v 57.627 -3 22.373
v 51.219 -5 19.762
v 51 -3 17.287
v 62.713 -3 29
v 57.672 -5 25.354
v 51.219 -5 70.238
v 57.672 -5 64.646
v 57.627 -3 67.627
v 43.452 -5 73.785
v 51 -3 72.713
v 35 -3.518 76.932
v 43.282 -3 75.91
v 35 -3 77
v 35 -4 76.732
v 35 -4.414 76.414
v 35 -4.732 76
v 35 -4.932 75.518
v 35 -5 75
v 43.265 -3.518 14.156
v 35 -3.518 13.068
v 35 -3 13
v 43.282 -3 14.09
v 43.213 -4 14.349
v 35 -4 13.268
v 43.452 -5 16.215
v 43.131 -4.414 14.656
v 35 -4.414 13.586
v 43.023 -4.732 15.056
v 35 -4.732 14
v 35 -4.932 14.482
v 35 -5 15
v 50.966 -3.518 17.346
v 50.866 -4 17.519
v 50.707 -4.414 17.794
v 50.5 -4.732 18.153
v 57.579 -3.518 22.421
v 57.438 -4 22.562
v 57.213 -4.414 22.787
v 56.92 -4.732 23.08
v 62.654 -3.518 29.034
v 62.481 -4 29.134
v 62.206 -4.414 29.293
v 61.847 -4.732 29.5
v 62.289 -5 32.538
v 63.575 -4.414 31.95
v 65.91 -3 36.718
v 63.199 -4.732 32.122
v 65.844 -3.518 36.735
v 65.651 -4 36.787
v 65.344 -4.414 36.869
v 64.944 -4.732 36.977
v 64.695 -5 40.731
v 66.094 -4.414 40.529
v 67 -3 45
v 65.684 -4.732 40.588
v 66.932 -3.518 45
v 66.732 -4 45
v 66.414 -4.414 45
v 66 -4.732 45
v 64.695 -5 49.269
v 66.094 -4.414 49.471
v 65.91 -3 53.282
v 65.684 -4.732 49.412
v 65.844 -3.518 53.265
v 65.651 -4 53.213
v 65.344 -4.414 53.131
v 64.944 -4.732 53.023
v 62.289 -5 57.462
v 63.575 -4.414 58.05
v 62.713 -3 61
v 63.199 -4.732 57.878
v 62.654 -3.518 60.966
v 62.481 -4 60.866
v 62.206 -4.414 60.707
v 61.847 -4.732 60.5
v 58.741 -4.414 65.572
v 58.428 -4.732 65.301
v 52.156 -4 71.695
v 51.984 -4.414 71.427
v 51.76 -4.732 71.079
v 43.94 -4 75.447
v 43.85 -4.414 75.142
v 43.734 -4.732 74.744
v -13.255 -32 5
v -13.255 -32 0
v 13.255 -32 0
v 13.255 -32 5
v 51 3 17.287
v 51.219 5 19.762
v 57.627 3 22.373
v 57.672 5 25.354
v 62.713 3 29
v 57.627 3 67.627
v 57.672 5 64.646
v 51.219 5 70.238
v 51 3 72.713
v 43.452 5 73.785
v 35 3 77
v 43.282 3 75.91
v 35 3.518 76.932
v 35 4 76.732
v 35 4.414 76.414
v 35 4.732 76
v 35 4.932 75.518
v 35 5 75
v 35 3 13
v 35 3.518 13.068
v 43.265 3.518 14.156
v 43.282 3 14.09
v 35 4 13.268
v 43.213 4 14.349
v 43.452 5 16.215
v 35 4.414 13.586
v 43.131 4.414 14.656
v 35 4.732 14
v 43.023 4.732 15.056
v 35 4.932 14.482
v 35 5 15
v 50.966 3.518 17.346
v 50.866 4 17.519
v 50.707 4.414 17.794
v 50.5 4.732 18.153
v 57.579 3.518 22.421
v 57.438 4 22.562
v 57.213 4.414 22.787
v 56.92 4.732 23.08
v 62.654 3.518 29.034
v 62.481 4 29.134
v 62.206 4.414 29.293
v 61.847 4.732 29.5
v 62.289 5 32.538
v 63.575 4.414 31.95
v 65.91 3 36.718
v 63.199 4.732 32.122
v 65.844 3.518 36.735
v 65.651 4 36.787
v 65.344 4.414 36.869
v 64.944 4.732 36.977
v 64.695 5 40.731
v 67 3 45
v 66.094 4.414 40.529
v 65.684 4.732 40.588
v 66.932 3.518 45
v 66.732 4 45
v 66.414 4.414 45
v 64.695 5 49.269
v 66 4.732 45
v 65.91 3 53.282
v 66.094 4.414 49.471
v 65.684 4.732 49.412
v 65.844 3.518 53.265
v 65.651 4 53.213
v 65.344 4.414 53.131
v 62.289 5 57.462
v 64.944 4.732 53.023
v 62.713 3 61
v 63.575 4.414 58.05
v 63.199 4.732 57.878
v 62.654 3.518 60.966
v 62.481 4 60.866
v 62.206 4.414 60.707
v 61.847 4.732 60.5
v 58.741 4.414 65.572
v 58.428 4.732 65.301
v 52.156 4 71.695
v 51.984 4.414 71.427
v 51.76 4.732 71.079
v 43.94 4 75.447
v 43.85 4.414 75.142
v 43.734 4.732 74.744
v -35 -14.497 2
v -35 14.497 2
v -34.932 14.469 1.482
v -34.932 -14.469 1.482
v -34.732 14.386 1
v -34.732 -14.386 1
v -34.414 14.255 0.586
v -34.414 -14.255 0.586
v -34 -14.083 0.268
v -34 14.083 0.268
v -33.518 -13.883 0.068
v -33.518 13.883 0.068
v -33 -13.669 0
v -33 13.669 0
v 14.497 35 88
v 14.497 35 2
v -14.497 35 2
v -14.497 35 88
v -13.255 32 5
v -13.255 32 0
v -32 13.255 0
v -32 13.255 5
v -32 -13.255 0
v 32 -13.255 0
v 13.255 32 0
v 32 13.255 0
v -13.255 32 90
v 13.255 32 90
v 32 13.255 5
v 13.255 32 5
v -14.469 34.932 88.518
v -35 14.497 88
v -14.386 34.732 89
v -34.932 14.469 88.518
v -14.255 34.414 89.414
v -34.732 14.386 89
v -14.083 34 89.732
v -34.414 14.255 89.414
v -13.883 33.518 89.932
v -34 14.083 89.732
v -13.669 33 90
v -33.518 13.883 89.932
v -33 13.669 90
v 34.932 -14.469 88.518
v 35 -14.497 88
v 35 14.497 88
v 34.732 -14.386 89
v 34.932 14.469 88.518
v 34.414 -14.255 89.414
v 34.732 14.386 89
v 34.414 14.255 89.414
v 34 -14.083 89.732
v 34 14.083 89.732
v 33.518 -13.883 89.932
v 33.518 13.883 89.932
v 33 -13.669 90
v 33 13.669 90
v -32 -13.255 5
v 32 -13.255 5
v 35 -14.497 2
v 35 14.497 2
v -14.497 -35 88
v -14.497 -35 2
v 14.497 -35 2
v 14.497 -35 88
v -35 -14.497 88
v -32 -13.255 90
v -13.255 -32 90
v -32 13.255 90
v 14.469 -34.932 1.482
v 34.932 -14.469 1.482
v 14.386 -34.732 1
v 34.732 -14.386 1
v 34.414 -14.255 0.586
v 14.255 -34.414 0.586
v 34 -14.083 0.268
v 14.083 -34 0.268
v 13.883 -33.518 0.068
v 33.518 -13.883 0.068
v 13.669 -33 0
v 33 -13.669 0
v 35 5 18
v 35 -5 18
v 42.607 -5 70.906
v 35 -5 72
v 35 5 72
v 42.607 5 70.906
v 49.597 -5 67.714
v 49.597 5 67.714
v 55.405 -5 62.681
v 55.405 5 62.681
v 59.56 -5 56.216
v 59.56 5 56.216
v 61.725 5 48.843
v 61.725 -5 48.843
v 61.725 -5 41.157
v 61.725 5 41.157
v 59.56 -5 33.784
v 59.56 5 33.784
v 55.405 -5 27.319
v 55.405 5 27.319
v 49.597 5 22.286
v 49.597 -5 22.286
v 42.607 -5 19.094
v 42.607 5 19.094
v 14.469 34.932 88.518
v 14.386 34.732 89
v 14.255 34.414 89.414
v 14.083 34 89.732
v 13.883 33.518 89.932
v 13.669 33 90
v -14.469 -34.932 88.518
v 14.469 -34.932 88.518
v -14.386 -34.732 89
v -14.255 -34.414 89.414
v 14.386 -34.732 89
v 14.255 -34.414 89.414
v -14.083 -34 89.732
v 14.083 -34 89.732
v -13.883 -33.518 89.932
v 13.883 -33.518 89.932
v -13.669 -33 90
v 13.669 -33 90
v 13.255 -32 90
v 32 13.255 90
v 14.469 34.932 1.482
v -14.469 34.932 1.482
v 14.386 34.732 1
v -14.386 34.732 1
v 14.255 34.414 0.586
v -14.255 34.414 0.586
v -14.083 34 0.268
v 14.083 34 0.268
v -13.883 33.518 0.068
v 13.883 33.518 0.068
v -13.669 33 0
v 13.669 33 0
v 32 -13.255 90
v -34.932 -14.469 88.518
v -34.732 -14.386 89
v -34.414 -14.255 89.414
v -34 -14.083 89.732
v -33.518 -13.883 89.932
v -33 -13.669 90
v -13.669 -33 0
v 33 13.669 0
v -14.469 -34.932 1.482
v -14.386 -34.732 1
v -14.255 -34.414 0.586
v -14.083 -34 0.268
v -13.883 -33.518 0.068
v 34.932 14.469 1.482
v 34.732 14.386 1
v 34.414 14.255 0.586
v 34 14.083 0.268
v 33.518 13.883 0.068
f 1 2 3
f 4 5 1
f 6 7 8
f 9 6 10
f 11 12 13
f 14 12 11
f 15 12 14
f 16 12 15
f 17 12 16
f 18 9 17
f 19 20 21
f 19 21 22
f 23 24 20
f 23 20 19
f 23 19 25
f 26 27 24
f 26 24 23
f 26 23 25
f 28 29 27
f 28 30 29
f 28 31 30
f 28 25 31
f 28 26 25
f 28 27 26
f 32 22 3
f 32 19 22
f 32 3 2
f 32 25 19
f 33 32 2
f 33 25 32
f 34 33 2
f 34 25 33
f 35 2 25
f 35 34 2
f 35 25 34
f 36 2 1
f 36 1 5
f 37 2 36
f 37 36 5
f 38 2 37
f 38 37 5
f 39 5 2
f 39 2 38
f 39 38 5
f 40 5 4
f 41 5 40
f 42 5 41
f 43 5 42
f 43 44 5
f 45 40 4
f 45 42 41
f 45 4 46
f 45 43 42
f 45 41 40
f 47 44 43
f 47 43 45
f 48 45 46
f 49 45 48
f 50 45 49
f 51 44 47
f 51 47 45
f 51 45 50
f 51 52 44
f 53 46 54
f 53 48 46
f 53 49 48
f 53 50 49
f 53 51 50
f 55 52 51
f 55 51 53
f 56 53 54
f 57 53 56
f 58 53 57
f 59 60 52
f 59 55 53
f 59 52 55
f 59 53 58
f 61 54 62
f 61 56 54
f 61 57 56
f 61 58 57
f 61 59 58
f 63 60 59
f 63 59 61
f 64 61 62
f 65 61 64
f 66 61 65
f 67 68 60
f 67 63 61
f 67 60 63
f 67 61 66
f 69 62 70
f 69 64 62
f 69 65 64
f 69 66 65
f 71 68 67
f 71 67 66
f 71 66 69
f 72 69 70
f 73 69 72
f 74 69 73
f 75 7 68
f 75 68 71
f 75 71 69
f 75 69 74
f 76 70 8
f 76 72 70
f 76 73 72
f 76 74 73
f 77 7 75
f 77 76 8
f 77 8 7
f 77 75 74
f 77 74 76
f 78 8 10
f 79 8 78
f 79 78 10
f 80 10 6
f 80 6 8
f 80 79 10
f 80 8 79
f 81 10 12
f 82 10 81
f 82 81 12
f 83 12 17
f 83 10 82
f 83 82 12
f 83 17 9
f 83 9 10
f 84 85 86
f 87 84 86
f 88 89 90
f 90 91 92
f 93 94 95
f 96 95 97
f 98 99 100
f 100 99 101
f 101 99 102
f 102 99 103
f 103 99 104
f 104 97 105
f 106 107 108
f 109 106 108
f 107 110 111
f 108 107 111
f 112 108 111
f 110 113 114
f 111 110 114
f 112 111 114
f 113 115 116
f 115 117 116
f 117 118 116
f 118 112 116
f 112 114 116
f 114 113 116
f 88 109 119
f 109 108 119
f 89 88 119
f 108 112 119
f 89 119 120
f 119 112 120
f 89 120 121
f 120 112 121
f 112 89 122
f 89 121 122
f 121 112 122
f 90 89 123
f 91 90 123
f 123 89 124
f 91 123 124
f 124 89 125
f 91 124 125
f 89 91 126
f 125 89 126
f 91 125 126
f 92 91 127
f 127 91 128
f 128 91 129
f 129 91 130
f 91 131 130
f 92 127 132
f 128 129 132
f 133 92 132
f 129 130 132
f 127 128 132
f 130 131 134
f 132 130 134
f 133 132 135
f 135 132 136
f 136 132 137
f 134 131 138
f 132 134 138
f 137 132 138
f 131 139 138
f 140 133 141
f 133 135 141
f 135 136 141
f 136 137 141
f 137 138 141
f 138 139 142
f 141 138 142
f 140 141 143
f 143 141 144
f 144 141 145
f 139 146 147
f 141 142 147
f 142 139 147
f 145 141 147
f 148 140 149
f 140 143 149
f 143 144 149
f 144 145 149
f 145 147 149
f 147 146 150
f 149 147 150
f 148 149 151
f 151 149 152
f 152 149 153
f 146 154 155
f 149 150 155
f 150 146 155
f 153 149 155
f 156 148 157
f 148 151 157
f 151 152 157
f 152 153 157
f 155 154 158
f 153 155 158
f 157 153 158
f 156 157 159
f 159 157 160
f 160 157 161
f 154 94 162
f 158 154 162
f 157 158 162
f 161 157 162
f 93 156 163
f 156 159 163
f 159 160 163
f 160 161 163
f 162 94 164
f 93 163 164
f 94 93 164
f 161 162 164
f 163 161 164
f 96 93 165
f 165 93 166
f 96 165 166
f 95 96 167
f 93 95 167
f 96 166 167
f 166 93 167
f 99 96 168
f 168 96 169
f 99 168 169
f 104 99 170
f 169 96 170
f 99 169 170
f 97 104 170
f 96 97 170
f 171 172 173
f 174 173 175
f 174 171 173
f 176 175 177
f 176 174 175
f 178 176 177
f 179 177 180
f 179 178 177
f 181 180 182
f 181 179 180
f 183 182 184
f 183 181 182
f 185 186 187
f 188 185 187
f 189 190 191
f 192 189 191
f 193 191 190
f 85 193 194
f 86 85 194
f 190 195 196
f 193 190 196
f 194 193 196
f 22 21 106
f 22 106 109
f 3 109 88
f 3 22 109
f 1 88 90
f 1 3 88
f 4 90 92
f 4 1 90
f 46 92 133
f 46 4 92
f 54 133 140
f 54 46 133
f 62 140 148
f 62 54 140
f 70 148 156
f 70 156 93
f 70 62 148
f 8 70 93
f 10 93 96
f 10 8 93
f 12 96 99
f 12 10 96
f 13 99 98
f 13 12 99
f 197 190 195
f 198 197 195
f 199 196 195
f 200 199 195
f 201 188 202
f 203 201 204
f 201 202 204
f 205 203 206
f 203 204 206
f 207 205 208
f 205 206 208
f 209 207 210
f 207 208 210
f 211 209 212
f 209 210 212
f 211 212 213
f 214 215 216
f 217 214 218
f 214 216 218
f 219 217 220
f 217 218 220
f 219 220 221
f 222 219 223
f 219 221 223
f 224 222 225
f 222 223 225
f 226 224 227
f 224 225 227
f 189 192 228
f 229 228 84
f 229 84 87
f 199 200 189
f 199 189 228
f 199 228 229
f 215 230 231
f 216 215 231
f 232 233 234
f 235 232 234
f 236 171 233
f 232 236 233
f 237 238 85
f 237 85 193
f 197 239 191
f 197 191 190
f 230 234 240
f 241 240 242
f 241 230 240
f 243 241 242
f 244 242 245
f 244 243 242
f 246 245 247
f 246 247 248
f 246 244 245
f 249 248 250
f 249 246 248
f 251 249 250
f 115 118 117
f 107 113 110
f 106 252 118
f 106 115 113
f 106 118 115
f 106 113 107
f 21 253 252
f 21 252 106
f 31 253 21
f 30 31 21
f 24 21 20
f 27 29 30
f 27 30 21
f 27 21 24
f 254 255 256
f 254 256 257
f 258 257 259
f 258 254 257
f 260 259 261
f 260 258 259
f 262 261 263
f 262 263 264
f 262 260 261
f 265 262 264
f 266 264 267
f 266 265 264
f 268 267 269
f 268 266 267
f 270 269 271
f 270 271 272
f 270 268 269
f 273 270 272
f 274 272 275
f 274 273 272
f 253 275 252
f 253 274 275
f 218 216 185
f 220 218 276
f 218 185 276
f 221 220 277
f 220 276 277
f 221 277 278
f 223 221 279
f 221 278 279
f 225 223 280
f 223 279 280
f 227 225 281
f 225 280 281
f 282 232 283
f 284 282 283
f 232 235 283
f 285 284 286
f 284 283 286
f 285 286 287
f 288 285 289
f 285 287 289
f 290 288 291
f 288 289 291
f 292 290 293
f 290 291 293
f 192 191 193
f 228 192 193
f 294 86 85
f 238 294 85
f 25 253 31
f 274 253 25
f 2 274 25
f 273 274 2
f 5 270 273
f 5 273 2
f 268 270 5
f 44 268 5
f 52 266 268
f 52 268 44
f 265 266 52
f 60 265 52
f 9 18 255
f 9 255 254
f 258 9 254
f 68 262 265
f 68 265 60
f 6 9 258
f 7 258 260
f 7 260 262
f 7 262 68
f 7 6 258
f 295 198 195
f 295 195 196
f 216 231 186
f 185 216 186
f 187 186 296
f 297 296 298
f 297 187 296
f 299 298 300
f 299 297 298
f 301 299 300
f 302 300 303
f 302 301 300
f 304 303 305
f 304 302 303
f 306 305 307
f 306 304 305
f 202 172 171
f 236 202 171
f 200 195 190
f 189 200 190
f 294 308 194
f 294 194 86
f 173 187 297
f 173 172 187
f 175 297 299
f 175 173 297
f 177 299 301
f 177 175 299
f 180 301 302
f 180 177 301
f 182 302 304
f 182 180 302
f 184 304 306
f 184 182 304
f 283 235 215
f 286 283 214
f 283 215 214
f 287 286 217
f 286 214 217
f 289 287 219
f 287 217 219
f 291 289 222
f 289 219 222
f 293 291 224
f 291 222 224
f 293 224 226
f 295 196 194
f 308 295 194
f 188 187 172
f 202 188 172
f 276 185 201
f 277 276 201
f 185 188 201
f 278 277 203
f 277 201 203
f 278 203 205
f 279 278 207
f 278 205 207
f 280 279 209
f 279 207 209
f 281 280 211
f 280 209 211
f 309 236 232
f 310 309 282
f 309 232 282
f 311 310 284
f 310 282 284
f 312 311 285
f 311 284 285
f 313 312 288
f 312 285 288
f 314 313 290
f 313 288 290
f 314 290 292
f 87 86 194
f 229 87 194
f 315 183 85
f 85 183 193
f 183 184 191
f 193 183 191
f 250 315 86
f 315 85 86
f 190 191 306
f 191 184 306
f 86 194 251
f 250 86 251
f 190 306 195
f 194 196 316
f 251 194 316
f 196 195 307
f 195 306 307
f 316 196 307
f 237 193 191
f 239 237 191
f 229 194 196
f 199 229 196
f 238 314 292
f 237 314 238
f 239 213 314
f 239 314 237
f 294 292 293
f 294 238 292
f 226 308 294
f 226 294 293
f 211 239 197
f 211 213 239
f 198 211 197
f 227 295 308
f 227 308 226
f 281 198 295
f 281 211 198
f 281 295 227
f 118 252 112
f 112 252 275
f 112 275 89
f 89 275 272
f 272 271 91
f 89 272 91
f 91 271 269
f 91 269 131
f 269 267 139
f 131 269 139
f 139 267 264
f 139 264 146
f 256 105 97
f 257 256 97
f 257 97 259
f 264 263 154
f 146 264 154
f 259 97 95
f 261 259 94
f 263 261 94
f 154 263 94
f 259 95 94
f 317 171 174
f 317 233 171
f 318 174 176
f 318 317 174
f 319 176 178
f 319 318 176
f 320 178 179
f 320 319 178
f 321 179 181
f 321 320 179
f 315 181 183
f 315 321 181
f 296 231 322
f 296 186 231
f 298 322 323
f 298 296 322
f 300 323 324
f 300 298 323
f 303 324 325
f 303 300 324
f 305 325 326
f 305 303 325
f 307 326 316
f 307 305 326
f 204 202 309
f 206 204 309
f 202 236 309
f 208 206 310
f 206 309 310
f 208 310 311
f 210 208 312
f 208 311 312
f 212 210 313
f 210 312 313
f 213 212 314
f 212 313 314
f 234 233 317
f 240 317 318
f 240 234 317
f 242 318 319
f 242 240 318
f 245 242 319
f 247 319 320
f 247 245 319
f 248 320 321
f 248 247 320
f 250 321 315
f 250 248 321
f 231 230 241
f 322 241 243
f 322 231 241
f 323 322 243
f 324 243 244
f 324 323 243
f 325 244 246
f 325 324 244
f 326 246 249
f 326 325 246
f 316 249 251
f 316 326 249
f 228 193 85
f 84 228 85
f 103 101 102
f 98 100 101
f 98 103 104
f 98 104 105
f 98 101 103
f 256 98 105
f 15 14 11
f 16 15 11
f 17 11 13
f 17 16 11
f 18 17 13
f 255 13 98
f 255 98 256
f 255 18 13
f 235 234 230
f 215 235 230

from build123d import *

# Parameters (mm, degrees)
F1_DEPTH      = 90
F2_DEPTH      = 5
F4_DEPTH      = 5
F4_DEPTH_BACK = 5
F5_R          = 2
F5_2_R        = 2


# Not quite as in the source:
# - a feature names something its author has since deleted; it is built from what else it names


with BuildPart() as f1:
    # F0 (on Top) → F1 (new body)
    with BuildSketch(Plane.XY):
        Polygon((14.4974746831, 35), (-14.4974746831, 35), (-35, 14.4974746831), (-35, -14.4974746831), (-14.4974746831, -35), (14.4974746831, -35), (35, -14.4974746831), (35, 14.4974746831), align=None)
        Polygon((-32, 13.2548339959), (-13.2548339959, 32), (13.2548339959, 32), (32, 13.2548339959), (32, -13.2548339959), (13.2548339959, -32), (-13.2548339959, -32), (-32, -13.2548339959), align=None, mode=Mode.SUBTRACT)
    extrude(amount=F1_DEPTH)

    # F5
    f5_edges = [f1.edges().sort_by_distance(p)[0] for p in [
        (24.748737, 24.748737, 90),
        (0, 35, 90),
        (-24.748737, 24.748737, 90),
        (-35, 0, 90),
        (-24.748737, -24.748737, 90),
        (0, -35, 90),
        (24.748737, -24.748737, 90),
        (35, 0, 90),
        (35, 0, 0),
        (24.748737, 24.748737, 0),
        (0, 35, 0),
        (-24.748737, 24.748737, 0),
        (-35, 0, 0),
        (-24.748737, -24.748737, 0),
        (0, -35, 0),
        (24.748737, -24.748737, 0),
    ]]
    fillet(f5_edges, radius=F5_R)


with BuildPart() as f2:
    # F0 (on Top) → F2 (new body)
    with BuildSketch(Plane.XY):
        Polygon((13.2548339959, 32), (-13.2548339959, 32), (-32, 13.2548339959), (-32, -13.2548339959), (-13.2548339959, -32), (13.2548339959, -32), (32, -13.2548339959), (32, 13.2548339959), align=None)
    extrude(amount=F2_DEPTH)


with BuildPart() as f4:
    # F3 (on Front) → F4 (new body, two sides)
    with BuildSketch(Plane.XZ) as f4_sk:
        with BuildLine():
            ThreePointArc((35, 13), (67, 45), (35, 77))
            Line((35, 77), (35, 72))
            ThreePointArc((35, 72), (62, 45), (35, 18))
            Line((35, 18), (35, 13))
        make_face()
    extrude(amount=F4_DEPTH)
    extrude(f4_sk.sketch, amount=-F4_DEPTH_BACK)

    # F5#2
    f5_2_edges = [f4.edges().sort_by_distance(p)[0] for p in [
        (67, -5, 45),
        (67, 5, 45),
    ]]
    fillet(f5_2_edges, radius=F5_2_R)


solid = Compound([f1.part, f2.part, f4.part])
